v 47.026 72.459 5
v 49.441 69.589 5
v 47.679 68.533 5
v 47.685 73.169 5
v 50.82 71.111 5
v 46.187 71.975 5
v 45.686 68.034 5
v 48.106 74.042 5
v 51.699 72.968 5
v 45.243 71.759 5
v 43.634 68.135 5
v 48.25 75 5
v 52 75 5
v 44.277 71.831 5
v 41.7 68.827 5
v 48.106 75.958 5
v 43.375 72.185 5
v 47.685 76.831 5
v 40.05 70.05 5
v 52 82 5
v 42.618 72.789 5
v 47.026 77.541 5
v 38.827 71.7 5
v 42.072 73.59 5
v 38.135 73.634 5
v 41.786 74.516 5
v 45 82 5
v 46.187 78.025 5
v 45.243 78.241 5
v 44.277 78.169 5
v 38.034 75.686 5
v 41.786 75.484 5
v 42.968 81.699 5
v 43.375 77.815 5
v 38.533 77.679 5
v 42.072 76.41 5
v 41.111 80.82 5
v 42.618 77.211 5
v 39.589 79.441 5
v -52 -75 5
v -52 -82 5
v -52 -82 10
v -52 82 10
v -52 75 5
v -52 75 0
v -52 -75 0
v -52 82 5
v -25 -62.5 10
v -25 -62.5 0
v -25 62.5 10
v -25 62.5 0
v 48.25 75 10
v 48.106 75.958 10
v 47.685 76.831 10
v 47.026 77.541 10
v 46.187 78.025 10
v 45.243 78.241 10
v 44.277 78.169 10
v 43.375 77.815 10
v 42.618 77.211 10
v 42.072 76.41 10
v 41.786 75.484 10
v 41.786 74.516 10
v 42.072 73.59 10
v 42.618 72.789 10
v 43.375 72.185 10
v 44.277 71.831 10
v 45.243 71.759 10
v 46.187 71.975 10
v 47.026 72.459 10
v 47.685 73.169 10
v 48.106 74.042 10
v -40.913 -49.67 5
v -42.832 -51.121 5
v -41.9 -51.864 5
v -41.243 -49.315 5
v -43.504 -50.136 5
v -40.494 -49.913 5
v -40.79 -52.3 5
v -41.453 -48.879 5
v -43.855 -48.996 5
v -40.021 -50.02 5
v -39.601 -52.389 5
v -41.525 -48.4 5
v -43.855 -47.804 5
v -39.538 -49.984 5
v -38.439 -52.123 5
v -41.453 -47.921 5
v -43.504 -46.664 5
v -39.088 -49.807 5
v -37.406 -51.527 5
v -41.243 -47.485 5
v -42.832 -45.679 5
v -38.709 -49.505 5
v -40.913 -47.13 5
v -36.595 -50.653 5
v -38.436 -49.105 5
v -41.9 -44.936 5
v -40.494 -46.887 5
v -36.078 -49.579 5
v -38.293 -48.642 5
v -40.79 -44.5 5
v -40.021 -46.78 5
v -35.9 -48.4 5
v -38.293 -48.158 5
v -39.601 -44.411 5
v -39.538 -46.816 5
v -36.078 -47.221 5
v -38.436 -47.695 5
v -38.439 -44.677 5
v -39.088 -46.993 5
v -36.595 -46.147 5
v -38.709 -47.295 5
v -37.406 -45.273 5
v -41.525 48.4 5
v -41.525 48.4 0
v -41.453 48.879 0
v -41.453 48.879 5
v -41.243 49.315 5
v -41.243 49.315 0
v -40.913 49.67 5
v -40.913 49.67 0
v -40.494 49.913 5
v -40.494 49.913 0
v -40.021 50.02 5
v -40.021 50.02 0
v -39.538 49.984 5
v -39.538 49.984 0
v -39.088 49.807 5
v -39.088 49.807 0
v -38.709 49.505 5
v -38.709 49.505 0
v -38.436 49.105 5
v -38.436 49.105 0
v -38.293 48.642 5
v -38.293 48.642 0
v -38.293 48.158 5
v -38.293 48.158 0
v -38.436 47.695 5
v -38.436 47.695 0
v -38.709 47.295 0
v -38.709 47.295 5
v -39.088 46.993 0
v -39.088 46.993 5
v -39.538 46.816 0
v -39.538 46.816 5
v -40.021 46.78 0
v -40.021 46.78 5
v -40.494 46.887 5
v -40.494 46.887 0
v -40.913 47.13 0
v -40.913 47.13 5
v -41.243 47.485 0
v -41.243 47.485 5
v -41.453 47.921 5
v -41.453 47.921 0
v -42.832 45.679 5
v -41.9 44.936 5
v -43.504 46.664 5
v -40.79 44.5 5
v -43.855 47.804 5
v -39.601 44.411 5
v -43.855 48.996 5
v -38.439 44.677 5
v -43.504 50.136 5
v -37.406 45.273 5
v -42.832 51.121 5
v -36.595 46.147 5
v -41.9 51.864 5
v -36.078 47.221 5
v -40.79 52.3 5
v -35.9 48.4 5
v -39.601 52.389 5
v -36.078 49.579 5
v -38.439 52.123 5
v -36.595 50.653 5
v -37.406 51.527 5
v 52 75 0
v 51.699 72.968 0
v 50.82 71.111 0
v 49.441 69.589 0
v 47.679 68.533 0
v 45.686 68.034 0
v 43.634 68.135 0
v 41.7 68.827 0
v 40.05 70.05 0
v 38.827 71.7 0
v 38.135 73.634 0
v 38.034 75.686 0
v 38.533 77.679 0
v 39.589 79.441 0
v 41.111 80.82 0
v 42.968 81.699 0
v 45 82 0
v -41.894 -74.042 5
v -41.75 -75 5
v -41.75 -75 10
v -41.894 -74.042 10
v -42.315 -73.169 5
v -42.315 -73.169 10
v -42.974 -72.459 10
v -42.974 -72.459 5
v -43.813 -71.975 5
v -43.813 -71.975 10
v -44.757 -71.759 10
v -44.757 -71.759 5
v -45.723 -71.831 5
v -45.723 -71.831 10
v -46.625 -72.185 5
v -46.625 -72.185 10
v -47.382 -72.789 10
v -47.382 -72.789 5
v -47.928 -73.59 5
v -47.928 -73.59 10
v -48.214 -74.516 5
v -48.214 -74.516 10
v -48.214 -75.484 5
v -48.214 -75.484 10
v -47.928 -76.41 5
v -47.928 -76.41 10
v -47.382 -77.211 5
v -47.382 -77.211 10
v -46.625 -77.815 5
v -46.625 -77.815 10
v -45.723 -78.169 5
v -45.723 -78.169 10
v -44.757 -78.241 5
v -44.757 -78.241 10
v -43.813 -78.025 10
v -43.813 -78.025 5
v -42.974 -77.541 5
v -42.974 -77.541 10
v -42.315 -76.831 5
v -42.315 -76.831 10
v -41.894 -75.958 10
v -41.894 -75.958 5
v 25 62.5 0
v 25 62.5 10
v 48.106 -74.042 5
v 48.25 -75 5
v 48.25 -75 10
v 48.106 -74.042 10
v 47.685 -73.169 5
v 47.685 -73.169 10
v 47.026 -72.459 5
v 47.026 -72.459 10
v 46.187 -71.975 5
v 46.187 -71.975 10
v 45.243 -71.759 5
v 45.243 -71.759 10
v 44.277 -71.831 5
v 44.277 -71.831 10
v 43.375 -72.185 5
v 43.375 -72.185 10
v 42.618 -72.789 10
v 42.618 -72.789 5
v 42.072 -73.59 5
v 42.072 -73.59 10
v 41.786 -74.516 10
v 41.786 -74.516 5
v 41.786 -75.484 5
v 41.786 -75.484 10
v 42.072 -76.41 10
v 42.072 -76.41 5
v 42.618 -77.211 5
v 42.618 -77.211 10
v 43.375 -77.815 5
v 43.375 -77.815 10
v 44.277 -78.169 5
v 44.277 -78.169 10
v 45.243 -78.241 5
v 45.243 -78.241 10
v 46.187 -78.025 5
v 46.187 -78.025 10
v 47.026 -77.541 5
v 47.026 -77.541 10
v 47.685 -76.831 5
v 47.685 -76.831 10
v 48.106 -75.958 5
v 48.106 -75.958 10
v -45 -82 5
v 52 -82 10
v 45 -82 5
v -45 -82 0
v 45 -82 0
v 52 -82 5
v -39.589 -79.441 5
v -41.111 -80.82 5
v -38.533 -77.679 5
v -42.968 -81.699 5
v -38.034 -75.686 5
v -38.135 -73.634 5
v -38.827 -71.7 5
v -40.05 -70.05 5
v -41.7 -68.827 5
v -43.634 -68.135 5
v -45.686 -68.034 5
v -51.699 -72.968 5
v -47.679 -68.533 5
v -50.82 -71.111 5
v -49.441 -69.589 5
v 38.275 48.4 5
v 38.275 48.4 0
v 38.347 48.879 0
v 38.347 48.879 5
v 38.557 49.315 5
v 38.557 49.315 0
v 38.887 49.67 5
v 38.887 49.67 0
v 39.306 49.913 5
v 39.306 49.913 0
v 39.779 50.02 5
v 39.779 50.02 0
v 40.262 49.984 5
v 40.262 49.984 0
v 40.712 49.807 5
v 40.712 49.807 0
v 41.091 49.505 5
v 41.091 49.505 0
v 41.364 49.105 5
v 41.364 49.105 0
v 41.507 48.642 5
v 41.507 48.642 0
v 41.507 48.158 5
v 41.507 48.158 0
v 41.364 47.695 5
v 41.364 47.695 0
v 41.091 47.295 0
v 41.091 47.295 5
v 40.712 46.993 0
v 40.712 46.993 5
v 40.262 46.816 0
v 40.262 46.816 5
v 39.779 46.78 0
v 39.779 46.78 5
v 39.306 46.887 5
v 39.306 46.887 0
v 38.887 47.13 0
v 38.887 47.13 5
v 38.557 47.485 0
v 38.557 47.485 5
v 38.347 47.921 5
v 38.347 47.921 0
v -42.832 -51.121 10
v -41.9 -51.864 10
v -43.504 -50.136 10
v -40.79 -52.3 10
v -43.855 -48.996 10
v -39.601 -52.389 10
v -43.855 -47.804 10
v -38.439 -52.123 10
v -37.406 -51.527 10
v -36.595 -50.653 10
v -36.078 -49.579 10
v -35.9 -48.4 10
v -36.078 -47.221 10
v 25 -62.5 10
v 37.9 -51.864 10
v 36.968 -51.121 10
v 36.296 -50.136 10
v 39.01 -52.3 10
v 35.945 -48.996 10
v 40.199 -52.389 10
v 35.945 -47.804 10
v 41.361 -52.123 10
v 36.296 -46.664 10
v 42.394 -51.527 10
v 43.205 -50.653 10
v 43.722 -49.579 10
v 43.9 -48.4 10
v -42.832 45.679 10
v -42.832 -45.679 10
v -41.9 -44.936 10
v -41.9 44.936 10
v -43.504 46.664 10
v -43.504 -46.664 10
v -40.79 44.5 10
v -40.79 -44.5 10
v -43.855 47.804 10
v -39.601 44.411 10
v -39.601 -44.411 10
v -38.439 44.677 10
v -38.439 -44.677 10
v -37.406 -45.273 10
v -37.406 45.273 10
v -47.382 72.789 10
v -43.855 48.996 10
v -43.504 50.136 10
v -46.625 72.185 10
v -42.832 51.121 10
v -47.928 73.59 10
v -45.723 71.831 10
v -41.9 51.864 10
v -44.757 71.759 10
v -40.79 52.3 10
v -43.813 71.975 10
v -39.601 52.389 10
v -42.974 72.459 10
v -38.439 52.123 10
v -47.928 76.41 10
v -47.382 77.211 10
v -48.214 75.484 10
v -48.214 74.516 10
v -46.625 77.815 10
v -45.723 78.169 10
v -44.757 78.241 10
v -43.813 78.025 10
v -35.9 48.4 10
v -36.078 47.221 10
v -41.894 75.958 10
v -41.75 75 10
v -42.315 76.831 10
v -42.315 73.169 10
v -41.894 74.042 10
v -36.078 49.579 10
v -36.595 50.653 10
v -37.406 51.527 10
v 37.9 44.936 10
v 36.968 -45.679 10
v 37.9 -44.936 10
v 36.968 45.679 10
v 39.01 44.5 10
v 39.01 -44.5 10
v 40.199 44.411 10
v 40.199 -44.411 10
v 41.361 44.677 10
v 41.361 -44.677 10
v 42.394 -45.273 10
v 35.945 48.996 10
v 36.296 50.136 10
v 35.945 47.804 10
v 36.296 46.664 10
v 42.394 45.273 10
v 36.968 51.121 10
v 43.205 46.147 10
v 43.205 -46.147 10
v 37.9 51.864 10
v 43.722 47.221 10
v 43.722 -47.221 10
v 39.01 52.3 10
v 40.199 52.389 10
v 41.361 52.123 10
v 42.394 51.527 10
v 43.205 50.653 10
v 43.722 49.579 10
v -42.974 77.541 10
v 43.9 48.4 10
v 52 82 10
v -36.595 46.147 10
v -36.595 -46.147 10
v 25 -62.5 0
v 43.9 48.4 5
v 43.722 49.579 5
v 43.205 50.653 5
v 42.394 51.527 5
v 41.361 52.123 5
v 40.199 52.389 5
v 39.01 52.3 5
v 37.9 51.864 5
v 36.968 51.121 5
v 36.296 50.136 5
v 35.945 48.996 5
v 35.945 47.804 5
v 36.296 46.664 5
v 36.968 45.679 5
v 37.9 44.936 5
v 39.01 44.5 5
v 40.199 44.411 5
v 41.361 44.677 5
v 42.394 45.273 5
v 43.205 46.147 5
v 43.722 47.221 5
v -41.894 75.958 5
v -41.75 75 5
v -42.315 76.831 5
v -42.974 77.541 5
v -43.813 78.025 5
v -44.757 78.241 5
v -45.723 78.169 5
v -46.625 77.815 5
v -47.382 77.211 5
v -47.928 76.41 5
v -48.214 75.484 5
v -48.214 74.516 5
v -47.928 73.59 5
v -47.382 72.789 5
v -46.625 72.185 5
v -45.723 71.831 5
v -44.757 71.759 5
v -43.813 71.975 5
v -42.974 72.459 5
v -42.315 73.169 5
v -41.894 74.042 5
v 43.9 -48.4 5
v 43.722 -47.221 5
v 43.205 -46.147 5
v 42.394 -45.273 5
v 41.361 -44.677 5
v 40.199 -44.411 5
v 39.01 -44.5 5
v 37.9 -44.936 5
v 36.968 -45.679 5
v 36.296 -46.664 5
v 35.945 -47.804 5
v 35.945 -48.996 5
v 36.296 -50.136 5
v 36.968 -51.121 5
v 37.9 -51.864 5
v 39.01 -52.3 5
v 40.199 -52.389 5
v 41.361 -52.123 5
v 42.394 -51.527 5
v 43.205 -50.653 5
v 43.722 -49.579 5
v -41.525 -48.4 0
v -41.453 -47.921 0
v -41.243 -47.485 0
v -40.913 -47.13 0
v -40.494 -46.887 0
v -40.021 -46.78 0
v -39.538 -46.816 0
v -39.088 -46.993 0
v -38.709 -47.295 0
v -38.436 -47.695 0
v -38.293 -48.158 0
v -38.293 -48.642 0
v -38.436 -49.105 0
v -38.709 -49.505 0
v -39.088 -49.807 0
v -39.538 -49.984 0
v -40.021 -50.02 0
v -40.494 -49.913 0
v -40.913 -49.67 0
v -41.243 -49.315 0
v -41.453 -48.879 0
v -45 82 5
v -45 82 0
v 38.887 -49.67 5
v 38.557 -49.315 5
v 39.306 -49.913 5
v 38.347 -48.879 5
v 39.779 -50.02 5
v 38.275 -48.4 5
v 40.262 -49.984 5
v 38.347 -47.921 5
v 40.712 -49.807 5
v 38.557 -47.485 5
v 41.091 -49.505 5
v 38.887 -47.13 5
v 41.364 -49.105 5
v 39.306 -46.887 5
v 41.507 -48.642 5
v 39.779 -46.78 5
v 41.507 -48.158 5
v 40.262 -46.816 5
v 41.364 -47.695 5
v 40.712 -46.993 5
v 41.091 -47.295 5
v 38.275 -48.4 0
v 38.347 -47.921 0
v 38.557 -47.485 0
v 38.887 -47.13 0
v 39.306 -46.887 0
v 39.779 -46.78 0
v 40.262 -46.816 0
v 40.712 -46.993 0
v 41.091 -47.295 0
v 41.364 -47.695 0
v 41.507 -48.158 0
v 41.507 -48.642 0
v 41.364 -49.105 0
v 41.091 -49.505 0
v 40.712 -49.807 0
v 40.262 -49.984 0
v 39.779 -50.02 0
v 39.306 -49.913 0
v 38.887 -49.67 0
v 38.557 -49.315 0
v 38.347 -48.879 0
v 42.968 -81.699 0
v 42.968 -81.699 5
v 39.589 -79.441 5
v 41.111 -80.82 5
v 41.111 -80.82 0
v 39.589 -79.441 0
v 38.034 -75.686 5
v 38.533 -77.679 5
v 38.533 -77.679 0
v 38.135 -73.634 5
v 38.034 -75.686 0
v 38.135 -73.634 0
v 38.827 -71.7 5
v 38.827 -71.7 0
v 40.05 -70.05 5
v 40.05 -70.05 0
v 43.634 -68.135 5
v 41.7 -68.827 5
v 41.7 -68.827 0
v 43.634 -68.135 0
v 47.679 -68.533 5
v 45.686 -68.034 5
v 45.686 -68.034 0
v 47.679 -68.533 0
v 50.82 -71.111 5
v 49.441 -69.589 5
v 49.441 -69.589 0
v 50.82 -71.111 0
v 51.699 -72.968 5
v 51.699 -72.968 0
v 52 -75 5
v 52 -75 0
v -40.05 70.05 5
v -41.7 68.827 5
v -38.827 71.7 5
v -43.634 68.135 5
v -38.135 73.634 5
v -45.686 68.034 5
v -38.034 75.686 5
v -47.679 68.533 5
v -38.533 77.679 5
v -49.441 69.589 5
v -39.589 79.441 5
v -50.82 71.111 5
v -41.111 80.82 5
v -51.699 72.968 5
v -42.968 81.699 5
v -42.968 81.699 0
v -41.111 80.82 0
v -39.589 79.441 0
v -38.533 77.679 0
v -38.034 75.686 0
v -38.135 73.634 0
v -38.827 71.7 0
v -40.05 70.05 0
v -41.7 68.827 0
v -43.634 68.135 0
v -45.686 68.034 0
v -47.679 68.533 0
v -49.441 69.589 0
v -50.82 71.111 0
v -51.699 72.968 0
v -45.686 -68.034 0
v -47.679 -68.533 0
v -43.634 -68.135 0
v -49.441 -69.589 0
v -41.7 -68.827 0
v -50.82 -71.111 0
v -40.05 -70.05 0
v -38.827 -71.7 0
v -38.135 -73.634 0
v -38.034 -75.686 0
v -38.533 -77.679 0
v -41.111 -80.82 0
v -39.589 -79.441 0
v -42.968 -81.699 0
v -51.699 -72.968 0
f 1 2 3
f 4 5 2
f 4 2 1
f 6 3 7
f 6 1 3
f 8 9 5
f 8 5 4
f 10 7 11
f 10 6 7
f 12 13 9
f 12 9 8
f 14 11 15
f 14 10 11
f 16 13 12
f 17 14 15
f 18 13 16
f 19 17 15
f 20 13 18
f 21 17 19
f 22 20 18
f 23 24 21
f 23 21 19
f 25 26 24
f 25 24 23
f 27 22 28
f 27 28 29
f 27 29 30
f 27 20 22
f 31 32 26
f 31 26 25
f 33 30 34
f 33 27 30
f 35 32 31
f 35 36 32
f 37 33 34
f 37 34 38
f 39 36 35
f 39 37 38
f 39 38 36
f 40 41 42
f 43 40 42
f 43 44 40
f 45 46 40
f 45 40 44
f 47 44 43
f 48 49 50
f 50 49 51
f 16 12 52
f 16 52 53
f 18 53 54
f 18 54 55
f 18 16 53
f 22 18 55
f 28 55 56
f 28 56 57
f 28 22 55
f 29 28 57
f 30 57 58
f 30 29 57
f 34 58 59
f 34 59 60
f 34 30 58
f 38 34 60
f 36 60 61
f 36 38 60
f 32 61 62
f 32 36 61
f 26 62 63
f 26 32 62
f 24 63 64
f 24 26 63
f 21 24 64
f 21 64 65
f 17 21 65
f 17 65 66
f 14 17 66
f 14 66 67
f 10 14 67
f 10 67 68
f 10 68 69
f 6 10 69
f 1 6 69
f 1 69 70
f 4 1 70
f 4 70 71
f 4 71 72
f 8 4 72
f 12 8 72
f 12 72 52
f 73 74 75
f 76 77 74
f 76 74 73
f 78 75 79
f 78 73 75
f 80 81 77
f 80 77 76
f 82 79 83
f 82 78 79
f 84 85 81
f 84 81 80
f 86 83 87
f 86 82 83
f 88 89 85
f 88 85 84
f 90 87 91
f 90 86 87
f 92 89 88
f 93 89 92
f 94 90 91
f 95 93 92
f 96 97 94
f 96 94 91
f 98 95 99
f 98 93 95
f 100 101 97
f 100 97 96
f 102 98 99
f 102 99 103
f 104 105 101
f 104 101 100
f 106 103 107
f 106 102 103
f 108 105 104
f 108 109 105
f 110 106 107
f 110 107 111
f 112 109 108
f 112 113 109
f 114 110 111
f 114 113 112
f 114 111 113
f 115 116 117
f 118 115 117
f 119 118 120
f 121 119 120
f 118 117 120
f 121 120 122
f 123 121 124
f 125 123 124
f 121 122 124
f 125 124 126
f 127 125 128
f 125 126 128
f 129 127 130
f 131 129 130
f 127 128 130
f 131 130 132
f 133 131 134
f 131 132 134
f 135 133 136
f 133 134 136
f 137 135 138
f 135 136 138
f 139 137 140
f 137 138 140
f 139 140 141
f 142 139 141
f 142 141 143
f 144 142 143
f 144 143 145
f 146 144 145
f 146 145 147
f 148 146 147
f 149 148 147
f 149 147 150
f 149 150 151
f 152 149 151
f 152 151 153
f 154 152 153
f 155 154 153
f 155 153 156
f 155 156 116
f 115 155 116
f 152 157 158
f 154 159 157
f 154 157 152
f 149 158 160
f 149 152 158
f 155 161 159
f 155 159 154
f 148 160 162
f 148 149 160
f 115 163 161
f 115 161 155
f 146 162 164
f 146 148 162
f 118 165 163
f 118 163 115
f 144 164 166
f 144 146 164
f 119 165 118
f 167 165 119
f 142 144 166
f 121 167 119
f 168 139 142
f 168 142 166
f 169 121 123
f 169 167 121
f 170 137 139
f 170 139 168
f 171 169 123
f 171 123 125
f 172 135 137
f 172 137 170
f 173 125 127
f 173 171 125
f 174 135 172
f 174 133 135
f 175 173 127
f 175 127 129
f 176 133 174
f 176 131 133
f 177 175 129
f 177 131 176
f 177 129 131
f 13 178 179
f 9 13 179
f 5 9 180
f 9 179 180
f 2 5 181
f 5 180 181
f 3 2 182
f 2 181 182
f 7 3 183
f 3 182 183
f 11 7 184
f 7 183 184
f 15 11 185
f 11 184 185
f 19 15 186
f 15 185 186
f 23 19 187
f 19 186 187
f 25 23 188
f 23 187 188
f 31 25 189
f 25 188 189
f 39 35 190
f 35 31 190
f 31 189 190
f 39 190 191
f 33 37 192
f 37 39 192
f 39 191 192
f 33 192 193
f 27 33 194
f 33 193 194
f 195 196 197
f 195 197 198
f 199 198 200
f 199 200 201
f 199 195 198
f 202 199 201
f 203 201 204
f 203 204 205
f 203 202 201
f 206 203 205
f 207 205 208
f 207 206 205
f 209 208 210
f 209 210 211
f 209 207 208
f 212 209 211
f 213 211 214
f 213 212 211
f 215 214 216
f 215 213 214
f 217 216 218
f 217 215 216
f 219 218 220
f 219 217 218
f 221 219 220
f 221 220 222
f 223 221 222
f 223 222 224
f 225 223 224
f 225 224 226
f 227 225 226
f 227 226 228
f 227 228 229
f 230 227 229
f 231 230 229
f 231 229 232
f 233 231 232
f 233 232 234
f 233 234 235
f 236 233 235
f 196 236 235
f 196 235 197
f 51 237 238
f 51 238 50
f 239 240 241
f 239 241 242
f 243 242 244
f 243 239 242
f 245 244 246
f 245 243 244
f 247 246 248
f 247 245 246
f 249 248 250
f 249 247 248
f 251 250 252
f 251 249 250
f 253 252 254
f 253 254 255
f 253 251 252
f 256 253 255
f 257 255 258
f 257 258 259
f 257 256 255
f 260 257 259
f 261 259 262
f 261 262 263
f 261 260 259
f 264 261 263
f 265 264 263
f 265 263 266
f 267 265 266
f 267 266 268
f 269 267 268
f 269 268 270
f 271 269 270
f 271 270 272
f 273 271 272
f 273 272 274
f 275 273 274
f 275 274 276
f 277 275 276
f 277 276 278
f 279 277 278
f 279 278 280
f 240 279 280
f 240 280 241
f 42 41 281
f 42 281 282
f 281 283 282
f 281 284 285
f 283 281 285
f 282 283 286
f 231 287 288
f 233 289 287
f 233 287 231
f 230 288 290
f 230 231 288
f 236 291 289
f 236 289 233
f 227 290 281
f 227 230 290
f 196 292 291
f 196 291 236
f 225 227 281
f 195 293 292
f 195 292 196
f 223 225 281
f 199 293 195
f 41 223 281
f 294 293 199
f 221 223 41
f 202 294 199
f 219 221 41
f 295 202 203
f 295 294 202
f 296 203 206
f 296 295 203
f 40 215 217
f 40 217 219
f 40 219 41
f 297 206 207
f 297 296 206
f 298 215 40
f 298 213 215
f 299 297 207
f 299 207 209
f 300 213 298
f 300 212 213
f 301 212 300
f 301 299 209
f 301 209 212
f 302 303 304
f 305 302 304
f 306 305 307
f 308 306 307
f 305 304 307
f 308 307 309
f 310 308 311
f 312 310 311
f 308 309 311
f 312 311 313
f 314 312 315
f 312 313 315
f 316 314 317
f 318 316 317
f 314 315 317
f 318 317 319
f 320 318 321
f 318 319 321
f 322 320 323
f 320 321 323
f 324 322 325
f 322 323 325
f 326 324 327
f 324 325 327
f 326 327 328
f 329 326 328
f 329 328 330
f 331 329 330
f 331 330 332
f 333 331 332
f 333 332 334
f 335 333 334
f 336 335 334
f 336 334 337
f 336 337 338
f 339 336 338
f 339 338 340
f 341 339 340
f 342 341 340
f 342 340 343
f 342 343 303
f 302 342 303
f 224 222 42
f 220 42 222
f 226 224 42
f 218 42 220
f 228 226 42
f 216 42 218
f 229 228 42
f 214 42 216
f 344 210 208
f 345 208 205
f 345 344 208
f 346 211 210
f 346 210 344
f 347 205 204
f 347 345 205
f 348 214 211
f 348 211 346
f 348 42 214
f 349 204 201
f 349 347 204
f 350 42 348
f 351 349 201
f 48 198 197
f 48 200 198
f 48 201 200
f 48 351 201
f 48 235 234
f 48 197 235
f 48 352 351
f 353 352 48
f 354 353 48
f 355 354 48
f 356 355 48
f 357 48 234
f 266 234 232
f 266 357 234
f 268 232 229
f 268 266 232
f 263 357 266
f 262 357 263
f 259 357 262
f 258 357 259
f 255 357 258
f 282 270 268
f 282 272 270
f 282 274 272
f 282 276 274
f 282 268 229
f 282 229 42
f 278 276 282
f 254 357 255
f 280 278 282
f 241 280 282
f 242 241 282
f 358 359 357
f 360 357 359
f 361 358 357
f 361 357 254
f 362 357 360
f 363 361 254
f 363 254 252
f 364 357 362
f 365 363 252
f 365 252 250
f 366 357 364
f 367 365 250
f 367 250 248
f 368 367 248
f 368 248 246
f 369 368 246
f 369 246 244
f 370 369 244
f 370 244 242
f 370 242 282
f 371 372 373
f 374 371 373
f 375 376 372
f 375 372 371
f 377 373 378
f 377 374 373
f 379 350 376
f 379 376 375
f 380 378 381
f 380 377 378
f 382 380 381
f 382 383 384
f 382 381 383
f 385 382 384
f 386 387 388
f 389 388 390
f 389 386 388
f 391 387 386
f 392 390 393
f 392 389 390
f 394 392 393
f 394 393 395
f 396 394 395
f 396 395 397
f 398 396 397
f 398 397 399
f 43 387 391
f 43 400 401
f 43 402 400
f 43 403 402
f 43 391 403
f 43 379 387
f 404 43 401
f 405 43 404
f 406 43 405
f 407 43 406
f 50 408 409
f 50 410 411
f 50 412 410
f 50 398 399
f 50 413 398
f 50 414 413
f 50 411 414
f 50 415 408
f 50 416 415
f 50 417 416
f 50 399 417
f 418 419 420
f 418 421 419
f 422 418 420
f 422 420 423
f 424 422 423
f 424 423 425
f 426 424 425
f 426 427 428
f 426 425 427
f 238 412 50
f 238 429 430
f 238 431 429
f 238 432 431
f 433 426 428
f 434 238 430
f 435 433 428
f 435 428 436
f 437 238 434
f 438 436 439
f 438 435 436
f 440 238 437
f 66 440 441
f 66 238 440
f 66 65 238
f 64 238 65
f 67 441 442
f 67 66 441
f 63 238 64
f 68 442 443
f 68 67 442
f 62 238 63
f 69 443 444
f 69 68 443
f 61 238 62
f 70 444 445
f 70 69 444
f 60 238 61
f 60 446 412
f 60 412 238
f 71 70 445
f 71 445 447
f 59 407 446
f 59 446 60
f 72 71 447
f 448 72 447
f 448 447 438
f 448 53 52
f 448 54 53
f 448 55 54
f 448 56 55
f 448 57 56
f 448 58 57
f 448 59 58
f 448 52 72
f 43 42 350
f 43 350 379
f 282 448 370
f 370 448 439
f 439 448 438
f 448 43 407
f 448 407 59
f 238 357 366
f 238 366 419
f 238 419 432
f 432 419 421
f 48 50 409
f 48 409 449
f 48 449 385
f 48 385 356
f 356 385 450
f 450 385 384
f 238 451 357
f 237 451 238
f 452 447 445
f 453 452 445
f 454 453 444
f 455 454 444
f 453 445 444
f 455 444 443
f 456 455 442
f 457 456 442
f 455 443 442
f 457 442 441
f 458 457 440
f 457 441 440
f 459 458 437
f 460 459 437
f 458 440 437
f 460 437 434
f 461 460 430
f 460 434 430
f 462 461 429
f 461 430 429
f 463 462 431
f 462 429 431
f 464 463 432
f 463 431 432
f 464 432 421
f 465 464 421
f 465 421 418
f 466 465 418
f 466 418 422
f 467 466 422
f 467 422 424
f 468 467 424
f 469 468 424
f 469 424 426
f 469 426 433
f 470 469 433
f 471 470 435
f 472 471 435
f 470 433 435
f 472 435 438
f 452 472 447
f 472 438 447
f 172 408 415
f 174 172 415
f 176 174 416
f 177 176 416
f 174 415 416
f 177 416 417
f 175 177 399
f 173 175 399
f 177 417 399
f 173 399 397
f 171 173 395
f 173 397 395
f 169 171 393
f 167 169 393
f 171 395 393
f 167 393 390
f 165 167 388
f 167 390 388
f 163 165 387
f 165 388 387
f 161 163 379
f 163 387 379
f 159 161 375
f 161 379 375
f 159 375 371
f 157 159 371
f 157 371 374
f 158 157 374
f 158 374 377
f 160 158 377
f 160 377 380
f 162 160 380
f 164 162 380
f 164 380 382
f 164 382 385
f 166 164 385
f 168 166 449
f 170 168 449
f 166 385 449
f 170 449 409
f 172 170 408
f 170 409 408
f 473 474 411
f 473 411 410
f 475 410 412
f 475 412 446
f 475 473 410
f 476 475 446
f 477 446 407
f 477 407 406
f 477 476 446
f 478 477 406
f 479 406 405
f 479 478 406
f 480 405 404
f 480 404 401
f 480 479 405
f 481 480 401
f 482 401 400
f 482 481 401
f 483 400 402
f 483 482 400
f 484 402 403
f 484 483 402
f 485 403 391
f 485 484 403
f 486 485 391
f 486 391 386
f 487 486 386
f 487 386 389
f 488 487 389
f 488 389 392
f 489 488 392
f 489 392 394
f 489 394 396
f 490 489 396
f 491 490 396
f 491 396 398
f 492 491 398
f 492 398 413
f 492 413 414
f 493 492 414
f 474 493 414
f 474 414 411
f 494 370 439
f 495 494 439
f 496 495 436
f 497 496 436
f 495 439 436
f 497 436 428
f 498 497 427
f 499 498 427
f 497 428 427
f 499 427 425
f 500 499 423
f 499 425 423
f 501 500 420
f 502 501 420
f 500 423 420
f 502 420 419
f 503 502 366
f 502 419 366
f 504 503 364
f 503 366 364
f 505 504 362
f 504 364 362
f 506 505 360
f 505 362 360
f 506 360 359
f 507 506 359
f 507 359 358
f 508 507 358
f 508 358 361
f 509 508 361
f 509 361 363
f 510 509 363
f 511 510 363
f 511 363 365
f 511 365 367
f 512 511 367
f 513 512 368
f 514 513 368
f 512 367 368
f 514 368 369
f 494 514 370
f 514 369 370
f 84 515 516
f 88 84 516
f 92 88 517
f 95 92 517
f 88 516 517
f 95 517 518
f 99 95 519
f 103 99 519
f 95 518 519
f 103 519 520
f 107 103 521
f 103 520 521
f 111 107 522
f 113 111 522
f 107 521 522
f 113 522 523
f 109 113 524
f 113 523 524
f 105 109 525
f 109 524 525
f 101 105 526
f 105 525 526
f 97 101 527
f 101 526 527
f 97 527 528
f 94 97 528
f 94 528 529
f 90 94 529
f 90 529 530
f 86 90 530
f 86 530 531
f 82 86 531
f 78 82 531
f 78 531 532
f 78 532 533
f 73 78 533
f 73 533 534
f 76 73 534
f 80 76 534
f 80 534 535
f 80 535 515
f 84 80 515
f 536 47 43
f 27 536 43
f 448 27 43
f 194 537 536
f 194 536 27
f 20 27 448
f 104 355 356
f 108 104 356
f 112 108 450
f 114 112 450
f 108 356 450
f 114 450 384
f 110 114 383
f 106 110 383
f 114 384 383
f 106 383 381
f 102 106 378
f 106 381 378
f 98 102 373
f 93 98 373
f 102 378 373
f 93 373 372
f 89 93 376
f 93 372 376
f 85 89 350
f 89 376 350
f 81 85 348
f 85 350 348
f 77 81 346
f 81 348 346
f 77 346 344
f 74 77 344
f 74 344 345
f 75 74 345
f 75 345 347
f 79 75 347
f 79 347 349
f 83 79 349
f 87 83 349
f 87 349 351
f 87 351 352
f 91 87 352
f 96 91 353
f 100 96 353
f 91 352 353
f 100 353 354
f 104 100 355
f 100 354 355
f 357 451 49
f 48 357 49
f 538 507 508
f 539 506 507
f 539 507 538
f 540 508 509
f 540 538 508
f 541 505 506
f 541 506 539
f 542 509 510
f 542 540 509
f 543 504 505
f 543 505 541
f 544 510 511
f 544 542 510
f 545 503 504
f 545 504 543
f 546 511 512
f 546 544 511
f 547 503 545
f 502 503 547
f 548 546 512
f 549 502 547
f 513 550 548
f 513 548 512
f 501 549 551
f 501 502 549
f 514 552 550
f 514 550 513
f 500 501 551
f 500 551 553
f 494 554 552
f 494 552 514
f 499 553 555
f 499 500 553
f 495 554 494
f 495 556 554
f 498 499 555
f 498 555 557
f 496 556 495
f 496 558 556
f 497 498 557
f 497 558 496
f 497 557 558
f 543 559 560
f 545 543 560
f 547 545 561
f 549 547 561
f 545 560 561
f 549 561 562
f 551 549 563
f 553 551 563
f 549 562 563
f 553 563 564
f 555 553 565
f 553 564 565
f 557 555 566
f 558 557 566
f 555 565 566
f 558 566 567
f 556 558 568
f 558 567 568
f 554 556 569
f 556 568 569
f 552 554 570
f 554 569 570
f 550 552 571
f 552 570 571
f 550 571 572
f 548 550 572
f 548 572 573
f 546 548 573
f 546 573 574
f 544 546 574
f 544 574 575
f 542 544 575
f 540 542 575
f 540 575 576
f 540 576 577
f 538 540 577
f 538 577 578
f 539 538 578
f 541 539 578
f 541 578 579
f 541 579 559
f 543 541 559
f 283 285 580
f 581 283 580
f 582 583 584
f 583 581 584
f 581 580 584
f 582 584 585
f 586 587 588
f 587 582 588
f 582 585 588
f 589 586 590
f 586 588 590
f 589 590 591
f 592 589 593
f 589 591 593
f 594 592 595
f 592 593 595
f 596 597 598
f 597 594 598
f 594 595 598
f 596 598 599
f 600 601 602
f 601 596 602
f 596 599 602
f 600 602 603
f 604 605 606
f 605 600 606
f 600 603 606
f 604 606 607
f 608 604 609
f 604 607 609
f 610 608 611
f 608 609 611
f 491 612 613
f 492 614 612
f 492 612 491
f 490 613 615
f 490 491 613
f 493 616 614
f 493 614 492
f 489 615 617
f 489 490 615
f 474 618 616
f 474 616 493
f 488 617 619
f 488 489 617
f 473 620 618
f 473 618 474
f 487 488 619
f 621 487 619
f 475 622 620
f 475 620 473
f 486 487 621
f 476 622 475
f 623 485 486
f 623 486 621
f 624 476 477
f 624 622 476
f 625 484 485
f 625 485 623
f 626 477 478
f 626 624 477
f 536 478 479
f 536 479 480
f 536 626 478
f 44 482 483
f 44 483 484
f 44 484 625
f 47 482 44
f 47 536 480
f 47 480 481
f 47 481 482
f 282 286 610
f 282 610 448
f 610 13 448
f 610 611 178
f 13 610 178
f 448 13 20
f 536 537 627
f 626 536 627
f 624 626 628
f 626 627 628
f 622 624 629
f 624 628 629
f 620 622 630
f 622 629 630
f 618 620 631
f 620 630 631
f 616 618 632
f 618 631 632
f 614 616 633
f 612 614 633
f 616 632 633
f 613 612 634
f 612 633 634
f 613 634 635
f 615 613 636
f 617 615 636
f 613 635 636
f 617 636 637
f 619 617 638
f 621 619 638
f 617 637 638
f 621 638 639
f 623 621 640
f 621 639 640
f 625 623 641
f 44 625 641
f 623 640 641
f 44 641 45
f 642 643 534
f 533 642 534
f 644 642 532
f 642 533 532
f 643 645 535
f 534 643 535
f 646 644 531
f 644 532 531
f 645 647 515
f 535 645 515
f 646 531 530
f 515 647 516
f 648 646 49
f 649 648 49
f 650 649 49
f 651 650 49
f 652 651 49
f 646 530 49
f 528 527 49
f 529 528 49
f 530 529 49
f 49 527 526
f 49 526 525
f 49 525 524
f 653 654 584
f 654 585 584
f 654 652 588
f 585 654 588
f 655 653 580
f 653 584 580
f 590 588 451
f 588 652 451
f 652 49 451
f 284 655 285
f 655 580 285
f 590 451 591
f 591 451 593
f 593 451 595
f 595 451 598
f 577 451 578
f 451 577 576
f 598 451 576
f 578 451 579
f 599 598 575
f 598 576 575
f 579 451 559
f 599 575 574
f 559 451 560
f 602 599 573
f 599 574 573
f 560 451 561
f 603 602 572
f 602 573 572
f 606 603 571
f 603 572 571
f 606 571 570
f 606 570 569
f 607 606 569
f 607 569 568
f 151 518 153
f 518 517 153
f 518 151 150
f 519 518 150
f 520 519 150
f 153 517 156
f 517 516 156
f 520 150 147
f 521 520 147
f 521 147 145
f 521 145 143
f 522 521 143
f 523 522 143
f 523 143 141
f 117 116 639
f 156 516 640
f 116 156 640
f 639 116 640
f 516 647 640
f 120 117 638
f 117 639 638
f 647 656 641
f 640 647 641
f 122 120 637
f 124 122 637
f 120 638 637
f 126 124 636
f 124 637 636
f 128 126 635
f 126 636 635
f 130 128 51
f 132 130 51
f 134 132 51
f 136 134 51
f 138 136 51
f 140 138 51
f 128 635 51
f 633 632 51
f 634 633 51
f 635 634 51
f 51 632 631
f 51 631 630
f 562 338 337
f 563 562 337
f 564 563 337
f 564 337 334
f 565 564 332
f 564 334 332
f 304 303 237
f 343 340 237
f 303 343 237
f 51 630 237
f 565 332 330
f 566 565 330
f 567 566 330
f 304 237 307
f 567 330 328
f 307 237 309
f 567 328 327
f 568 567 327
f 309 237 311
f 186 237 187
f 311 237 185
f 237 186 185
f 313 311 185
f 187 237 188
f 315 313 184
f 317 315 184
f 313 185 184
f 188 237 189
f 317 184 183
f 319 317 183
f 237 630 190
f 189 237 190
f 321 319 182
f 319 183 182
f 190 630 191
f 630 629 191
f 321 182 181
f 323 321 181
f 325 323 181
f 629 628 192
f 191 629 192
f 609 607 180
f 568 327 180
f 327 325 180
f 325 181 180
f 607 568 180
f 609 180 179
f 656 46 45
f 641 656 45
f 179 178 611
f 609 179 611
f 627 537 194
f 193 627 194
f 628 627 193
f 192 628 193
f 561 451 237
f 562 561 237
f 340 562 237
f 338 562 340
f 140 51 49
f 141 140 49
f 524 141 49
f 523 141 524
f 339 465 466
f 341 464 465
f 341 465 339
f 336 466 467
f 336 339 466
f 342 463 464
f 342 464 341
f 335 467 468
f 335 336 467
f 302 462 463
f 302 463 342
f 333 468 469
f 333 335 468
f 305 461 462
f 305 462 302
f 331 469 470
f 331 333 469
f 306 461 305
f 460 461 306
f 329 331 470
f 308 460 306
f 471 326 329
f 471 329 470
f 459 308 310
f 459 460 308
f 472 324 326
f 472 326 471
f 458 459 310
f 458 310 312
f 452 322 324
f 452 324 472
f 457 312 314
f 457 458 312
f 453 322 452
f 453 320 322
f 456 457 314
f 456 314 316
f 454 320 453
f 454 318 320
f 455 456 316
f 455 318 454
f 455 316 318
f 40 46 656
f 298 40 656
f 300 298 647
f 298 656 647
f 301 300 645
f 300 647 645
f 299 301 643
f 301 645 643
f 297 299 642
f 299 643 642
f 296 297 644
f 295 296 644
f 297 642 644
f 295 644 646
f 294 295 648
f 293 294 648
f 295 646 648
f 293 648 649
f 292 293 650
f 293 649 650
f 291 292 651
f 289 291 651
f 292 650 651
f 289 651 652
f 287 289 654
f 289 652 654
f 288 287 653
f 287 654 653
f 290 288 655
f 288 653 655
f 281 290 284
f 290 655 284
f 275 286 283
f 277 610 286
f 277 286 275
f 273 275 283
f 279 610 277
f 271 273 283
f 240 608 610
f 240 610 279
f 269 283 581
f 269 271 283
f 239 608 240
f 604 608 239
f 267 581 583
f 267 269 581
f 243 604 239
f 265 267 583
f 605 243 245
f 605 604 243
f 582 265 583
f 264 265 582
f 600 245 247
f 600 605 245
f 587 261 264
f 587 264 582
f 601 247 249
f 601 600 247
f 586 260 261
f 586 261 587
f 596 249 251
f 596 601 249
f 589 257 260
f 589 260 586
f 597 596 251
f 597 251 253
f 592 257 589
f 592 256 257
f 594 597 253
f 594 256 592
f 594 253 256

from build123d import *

# Parameters (mm, degrees)
SKETCH1_W           = 104
SKETCH1_H           = 164
SKETCH1_R           = 3.25
BOSS_EXTRUDE1_DEPTH = 10
SKETCH2_R           = 1.625
CUT_EXTRUDE1_DEPTH  = 10
SKETCH3_R           = 4
CUT_EXTRUDE2_DEPTH  = 5
SKETCH5_R           = 7
SKETCH5_R_2         = 3.25
CUT_EXTRUDE3_DEPTH  = 5
SKETCH6_W           = 50
SKETCH6_H           = 125
CUT_EXTRUDE4_DEPTH  = 52


with BuildPart() as part:
    # Sketch1 → Boss-Extrude1 (new body)
    with BuildSketch(Plane.XY):
        Rectangle(SKETCH1_W, SKETCH1_H)
        with Locations((-45, 75)):
            Circle(SKETCH1_R, mode=Mode.SUBTRACT)
        with Locations((45, 75)):
            Circle(SKETCH1_R, mode=Mode.SUBTRACT)
        with Locations((-45, -75)):
            Circle(SKETCH1_R, mode=Mode.SUBTRACT)
        with Locations((45, -75)):
            Circle(SKETCH1_R, mode=Mode.SUBTRACT)
    extrude(amount=BOSS_EXTRUDE1_DEPTH)

    # Sketch2 → Cut-Extrude1 (cut)
    with BuildSketch(Plane(origin=(0, 0, 0), x_dir=(-1, 0, 0), z_dir=(0, 0, -1))):
        with Locations((-39.9, 48.4)):
            Circle(SKETCH2_R)
        with Locations((39.9, 48.4)):
            Circle(SKETCH2_R)
        with Locations((-39.9, -48.4)):
            Circle(SKETCH2_R)
        with Locations((39.9, -48.4)):
            Circle(SKETCH2_R)
    extrude(amount=-CUT_EXTRUDE1_DEPTH, mode=Mode.SUBTRACT)

    # Sketch3 → Cut-Extrude2 (cut)
    with BuildSketch(Plane.XY.offset(10)):
        with Locations((-39.9, 48.4)):
            Circle(SKETCH3_R)
        with Locations((39.9, 48.4)):
            Circle(SKETCH3_R)
        with Locations((-39.9, -48.4)):
            Circle(SKETCH3_R)
        with Locations((39.9, -48.4)):
            Circle(SKETCH3_R)
    extrude(amount=-CUT_EXTRUDE2_DEPTH, mode=Mode.SUBTRACT)

    # Sketch5 → Cut-Extrude3 (cut)
    # profile 1 of 8: a face of its own
    with BuildSketch(Plane(origin=(0, 0, 0), x_dir=(-1, 0, 0), z_dir=(0, 0, -1))):
        with Locations((-45, 75)):
            Circle(SKETCH5_R)
        with Locations((-45, 75)):
            Circle(SKETCH5_R_2, mode=Mode.SUBTRACT)
    # profile 2 of 8: a face of its own
    with BuildSketch(Plane(origin=(0, 0, 0), x_dir=(-1, 0, 0), z_dir=(0, 0, -1))):
        with BuildLine():
            Line((-44.999999978, 82), (-52, 82))
            Line((-52, 82), (-52, 75))
            ThreePointArc((-52, 75), (-49.94974746, 79.949747476), (-44.999999978, 82))
        make_face()
    # profile 3 of 8: a face of its own
    with BuildSketch(Plane(origin=(0, 0, 0), x_dir=(-1, 0, 0), z_dir=(0, 0, -1))):
        with Locations((45, 75)):
            Circle(SKETCH5_R)
        with Locations((45, 75)):
            Circle(SKETCH5_R_2, mode=Mode.SUBTRACT)
    # profile 4 of 8: a face of its own
    with BuildSketch(Plane(origin=(0, 0, 0), x_dir=(-1, 0, 0), z_dir=(0, 0, -1))):
        with BuildLine():
            Line((52, 82), (45, 82))
            ThreePointArc((45, 82), (49.949747468, 79.949747468), (52, 75))
            Line((52, 75), (52, 82))
        make_face()
    # profile 5 of 8: a face of its own
    with BuildSketch(Plane(origin=(0, 0, 0), x_dir=(-1, 0, 0), z_dir=(0, 0, -1))):
        with Locations((-45, -75)):
            Circle(SKETCH5_R)
        with Locations((-45, -75)):
            Circle(SKETCH5_R_2, mode=Mode.SUBTRACT)
    # profile 6 of 8: a face of its own
    with BuildSketch(Plane(origin=(0, 0, 0), x_dir=(-1, 0, 0), z_dir=(0, 0, -1))):
        with Locations((45, -75)):
            Circle(SKETCH5_R)
        with Locations((45, -75)):
            Circle(SKETCH5_R_2, mode=Mode.SUBTRACT)
    # profile 7 of 8: a face of its own
    with BuildSketch(Plane(origin=(0, 0, 0), x_dir=(-1, 0, 0), z_dir=(0, 0, -1))):
        with BuildLine():
            Line((52, -82), (52, -75))
            ThreePointArc((52, -75), (49.949747468, -79.949747468), (45, -82))
            Line((45, -82), (52, -82))
        make_face()
    # profile 8 of 8: a face of its own
    with BuildSketch(Plane(origin=(0, 0, 0), x_dir=(-1, 0, 0), z_dir=(0, 0, -1))):
        with BuildLine():
            ThreePointArc((-45, -82), (-49.949747468, -79.949747468), (-52, -75))
            Line((-52, -75), (-52, -82))
            Line((-52, -82), (-45, -82))
        make_face()
    extrude(amount=-CUT_EXTRUDE3_DEPTH, mode=Mode.SUBTRACT)

    # Sketch6 → Cut-Extrude4 (cut)
    with BuildSketch(Plane(origin=(0, 0, 0), x_dir=(-1, 0, 0), z_dir=(0, 0, -1))):
        Rectangle(SKETCH6_W, SKETCH6_H)
    extrude(amount=-CUT_EXTRUDE4_DEPTH, mode=Mode.SUBTRACT)


solid = part.part
